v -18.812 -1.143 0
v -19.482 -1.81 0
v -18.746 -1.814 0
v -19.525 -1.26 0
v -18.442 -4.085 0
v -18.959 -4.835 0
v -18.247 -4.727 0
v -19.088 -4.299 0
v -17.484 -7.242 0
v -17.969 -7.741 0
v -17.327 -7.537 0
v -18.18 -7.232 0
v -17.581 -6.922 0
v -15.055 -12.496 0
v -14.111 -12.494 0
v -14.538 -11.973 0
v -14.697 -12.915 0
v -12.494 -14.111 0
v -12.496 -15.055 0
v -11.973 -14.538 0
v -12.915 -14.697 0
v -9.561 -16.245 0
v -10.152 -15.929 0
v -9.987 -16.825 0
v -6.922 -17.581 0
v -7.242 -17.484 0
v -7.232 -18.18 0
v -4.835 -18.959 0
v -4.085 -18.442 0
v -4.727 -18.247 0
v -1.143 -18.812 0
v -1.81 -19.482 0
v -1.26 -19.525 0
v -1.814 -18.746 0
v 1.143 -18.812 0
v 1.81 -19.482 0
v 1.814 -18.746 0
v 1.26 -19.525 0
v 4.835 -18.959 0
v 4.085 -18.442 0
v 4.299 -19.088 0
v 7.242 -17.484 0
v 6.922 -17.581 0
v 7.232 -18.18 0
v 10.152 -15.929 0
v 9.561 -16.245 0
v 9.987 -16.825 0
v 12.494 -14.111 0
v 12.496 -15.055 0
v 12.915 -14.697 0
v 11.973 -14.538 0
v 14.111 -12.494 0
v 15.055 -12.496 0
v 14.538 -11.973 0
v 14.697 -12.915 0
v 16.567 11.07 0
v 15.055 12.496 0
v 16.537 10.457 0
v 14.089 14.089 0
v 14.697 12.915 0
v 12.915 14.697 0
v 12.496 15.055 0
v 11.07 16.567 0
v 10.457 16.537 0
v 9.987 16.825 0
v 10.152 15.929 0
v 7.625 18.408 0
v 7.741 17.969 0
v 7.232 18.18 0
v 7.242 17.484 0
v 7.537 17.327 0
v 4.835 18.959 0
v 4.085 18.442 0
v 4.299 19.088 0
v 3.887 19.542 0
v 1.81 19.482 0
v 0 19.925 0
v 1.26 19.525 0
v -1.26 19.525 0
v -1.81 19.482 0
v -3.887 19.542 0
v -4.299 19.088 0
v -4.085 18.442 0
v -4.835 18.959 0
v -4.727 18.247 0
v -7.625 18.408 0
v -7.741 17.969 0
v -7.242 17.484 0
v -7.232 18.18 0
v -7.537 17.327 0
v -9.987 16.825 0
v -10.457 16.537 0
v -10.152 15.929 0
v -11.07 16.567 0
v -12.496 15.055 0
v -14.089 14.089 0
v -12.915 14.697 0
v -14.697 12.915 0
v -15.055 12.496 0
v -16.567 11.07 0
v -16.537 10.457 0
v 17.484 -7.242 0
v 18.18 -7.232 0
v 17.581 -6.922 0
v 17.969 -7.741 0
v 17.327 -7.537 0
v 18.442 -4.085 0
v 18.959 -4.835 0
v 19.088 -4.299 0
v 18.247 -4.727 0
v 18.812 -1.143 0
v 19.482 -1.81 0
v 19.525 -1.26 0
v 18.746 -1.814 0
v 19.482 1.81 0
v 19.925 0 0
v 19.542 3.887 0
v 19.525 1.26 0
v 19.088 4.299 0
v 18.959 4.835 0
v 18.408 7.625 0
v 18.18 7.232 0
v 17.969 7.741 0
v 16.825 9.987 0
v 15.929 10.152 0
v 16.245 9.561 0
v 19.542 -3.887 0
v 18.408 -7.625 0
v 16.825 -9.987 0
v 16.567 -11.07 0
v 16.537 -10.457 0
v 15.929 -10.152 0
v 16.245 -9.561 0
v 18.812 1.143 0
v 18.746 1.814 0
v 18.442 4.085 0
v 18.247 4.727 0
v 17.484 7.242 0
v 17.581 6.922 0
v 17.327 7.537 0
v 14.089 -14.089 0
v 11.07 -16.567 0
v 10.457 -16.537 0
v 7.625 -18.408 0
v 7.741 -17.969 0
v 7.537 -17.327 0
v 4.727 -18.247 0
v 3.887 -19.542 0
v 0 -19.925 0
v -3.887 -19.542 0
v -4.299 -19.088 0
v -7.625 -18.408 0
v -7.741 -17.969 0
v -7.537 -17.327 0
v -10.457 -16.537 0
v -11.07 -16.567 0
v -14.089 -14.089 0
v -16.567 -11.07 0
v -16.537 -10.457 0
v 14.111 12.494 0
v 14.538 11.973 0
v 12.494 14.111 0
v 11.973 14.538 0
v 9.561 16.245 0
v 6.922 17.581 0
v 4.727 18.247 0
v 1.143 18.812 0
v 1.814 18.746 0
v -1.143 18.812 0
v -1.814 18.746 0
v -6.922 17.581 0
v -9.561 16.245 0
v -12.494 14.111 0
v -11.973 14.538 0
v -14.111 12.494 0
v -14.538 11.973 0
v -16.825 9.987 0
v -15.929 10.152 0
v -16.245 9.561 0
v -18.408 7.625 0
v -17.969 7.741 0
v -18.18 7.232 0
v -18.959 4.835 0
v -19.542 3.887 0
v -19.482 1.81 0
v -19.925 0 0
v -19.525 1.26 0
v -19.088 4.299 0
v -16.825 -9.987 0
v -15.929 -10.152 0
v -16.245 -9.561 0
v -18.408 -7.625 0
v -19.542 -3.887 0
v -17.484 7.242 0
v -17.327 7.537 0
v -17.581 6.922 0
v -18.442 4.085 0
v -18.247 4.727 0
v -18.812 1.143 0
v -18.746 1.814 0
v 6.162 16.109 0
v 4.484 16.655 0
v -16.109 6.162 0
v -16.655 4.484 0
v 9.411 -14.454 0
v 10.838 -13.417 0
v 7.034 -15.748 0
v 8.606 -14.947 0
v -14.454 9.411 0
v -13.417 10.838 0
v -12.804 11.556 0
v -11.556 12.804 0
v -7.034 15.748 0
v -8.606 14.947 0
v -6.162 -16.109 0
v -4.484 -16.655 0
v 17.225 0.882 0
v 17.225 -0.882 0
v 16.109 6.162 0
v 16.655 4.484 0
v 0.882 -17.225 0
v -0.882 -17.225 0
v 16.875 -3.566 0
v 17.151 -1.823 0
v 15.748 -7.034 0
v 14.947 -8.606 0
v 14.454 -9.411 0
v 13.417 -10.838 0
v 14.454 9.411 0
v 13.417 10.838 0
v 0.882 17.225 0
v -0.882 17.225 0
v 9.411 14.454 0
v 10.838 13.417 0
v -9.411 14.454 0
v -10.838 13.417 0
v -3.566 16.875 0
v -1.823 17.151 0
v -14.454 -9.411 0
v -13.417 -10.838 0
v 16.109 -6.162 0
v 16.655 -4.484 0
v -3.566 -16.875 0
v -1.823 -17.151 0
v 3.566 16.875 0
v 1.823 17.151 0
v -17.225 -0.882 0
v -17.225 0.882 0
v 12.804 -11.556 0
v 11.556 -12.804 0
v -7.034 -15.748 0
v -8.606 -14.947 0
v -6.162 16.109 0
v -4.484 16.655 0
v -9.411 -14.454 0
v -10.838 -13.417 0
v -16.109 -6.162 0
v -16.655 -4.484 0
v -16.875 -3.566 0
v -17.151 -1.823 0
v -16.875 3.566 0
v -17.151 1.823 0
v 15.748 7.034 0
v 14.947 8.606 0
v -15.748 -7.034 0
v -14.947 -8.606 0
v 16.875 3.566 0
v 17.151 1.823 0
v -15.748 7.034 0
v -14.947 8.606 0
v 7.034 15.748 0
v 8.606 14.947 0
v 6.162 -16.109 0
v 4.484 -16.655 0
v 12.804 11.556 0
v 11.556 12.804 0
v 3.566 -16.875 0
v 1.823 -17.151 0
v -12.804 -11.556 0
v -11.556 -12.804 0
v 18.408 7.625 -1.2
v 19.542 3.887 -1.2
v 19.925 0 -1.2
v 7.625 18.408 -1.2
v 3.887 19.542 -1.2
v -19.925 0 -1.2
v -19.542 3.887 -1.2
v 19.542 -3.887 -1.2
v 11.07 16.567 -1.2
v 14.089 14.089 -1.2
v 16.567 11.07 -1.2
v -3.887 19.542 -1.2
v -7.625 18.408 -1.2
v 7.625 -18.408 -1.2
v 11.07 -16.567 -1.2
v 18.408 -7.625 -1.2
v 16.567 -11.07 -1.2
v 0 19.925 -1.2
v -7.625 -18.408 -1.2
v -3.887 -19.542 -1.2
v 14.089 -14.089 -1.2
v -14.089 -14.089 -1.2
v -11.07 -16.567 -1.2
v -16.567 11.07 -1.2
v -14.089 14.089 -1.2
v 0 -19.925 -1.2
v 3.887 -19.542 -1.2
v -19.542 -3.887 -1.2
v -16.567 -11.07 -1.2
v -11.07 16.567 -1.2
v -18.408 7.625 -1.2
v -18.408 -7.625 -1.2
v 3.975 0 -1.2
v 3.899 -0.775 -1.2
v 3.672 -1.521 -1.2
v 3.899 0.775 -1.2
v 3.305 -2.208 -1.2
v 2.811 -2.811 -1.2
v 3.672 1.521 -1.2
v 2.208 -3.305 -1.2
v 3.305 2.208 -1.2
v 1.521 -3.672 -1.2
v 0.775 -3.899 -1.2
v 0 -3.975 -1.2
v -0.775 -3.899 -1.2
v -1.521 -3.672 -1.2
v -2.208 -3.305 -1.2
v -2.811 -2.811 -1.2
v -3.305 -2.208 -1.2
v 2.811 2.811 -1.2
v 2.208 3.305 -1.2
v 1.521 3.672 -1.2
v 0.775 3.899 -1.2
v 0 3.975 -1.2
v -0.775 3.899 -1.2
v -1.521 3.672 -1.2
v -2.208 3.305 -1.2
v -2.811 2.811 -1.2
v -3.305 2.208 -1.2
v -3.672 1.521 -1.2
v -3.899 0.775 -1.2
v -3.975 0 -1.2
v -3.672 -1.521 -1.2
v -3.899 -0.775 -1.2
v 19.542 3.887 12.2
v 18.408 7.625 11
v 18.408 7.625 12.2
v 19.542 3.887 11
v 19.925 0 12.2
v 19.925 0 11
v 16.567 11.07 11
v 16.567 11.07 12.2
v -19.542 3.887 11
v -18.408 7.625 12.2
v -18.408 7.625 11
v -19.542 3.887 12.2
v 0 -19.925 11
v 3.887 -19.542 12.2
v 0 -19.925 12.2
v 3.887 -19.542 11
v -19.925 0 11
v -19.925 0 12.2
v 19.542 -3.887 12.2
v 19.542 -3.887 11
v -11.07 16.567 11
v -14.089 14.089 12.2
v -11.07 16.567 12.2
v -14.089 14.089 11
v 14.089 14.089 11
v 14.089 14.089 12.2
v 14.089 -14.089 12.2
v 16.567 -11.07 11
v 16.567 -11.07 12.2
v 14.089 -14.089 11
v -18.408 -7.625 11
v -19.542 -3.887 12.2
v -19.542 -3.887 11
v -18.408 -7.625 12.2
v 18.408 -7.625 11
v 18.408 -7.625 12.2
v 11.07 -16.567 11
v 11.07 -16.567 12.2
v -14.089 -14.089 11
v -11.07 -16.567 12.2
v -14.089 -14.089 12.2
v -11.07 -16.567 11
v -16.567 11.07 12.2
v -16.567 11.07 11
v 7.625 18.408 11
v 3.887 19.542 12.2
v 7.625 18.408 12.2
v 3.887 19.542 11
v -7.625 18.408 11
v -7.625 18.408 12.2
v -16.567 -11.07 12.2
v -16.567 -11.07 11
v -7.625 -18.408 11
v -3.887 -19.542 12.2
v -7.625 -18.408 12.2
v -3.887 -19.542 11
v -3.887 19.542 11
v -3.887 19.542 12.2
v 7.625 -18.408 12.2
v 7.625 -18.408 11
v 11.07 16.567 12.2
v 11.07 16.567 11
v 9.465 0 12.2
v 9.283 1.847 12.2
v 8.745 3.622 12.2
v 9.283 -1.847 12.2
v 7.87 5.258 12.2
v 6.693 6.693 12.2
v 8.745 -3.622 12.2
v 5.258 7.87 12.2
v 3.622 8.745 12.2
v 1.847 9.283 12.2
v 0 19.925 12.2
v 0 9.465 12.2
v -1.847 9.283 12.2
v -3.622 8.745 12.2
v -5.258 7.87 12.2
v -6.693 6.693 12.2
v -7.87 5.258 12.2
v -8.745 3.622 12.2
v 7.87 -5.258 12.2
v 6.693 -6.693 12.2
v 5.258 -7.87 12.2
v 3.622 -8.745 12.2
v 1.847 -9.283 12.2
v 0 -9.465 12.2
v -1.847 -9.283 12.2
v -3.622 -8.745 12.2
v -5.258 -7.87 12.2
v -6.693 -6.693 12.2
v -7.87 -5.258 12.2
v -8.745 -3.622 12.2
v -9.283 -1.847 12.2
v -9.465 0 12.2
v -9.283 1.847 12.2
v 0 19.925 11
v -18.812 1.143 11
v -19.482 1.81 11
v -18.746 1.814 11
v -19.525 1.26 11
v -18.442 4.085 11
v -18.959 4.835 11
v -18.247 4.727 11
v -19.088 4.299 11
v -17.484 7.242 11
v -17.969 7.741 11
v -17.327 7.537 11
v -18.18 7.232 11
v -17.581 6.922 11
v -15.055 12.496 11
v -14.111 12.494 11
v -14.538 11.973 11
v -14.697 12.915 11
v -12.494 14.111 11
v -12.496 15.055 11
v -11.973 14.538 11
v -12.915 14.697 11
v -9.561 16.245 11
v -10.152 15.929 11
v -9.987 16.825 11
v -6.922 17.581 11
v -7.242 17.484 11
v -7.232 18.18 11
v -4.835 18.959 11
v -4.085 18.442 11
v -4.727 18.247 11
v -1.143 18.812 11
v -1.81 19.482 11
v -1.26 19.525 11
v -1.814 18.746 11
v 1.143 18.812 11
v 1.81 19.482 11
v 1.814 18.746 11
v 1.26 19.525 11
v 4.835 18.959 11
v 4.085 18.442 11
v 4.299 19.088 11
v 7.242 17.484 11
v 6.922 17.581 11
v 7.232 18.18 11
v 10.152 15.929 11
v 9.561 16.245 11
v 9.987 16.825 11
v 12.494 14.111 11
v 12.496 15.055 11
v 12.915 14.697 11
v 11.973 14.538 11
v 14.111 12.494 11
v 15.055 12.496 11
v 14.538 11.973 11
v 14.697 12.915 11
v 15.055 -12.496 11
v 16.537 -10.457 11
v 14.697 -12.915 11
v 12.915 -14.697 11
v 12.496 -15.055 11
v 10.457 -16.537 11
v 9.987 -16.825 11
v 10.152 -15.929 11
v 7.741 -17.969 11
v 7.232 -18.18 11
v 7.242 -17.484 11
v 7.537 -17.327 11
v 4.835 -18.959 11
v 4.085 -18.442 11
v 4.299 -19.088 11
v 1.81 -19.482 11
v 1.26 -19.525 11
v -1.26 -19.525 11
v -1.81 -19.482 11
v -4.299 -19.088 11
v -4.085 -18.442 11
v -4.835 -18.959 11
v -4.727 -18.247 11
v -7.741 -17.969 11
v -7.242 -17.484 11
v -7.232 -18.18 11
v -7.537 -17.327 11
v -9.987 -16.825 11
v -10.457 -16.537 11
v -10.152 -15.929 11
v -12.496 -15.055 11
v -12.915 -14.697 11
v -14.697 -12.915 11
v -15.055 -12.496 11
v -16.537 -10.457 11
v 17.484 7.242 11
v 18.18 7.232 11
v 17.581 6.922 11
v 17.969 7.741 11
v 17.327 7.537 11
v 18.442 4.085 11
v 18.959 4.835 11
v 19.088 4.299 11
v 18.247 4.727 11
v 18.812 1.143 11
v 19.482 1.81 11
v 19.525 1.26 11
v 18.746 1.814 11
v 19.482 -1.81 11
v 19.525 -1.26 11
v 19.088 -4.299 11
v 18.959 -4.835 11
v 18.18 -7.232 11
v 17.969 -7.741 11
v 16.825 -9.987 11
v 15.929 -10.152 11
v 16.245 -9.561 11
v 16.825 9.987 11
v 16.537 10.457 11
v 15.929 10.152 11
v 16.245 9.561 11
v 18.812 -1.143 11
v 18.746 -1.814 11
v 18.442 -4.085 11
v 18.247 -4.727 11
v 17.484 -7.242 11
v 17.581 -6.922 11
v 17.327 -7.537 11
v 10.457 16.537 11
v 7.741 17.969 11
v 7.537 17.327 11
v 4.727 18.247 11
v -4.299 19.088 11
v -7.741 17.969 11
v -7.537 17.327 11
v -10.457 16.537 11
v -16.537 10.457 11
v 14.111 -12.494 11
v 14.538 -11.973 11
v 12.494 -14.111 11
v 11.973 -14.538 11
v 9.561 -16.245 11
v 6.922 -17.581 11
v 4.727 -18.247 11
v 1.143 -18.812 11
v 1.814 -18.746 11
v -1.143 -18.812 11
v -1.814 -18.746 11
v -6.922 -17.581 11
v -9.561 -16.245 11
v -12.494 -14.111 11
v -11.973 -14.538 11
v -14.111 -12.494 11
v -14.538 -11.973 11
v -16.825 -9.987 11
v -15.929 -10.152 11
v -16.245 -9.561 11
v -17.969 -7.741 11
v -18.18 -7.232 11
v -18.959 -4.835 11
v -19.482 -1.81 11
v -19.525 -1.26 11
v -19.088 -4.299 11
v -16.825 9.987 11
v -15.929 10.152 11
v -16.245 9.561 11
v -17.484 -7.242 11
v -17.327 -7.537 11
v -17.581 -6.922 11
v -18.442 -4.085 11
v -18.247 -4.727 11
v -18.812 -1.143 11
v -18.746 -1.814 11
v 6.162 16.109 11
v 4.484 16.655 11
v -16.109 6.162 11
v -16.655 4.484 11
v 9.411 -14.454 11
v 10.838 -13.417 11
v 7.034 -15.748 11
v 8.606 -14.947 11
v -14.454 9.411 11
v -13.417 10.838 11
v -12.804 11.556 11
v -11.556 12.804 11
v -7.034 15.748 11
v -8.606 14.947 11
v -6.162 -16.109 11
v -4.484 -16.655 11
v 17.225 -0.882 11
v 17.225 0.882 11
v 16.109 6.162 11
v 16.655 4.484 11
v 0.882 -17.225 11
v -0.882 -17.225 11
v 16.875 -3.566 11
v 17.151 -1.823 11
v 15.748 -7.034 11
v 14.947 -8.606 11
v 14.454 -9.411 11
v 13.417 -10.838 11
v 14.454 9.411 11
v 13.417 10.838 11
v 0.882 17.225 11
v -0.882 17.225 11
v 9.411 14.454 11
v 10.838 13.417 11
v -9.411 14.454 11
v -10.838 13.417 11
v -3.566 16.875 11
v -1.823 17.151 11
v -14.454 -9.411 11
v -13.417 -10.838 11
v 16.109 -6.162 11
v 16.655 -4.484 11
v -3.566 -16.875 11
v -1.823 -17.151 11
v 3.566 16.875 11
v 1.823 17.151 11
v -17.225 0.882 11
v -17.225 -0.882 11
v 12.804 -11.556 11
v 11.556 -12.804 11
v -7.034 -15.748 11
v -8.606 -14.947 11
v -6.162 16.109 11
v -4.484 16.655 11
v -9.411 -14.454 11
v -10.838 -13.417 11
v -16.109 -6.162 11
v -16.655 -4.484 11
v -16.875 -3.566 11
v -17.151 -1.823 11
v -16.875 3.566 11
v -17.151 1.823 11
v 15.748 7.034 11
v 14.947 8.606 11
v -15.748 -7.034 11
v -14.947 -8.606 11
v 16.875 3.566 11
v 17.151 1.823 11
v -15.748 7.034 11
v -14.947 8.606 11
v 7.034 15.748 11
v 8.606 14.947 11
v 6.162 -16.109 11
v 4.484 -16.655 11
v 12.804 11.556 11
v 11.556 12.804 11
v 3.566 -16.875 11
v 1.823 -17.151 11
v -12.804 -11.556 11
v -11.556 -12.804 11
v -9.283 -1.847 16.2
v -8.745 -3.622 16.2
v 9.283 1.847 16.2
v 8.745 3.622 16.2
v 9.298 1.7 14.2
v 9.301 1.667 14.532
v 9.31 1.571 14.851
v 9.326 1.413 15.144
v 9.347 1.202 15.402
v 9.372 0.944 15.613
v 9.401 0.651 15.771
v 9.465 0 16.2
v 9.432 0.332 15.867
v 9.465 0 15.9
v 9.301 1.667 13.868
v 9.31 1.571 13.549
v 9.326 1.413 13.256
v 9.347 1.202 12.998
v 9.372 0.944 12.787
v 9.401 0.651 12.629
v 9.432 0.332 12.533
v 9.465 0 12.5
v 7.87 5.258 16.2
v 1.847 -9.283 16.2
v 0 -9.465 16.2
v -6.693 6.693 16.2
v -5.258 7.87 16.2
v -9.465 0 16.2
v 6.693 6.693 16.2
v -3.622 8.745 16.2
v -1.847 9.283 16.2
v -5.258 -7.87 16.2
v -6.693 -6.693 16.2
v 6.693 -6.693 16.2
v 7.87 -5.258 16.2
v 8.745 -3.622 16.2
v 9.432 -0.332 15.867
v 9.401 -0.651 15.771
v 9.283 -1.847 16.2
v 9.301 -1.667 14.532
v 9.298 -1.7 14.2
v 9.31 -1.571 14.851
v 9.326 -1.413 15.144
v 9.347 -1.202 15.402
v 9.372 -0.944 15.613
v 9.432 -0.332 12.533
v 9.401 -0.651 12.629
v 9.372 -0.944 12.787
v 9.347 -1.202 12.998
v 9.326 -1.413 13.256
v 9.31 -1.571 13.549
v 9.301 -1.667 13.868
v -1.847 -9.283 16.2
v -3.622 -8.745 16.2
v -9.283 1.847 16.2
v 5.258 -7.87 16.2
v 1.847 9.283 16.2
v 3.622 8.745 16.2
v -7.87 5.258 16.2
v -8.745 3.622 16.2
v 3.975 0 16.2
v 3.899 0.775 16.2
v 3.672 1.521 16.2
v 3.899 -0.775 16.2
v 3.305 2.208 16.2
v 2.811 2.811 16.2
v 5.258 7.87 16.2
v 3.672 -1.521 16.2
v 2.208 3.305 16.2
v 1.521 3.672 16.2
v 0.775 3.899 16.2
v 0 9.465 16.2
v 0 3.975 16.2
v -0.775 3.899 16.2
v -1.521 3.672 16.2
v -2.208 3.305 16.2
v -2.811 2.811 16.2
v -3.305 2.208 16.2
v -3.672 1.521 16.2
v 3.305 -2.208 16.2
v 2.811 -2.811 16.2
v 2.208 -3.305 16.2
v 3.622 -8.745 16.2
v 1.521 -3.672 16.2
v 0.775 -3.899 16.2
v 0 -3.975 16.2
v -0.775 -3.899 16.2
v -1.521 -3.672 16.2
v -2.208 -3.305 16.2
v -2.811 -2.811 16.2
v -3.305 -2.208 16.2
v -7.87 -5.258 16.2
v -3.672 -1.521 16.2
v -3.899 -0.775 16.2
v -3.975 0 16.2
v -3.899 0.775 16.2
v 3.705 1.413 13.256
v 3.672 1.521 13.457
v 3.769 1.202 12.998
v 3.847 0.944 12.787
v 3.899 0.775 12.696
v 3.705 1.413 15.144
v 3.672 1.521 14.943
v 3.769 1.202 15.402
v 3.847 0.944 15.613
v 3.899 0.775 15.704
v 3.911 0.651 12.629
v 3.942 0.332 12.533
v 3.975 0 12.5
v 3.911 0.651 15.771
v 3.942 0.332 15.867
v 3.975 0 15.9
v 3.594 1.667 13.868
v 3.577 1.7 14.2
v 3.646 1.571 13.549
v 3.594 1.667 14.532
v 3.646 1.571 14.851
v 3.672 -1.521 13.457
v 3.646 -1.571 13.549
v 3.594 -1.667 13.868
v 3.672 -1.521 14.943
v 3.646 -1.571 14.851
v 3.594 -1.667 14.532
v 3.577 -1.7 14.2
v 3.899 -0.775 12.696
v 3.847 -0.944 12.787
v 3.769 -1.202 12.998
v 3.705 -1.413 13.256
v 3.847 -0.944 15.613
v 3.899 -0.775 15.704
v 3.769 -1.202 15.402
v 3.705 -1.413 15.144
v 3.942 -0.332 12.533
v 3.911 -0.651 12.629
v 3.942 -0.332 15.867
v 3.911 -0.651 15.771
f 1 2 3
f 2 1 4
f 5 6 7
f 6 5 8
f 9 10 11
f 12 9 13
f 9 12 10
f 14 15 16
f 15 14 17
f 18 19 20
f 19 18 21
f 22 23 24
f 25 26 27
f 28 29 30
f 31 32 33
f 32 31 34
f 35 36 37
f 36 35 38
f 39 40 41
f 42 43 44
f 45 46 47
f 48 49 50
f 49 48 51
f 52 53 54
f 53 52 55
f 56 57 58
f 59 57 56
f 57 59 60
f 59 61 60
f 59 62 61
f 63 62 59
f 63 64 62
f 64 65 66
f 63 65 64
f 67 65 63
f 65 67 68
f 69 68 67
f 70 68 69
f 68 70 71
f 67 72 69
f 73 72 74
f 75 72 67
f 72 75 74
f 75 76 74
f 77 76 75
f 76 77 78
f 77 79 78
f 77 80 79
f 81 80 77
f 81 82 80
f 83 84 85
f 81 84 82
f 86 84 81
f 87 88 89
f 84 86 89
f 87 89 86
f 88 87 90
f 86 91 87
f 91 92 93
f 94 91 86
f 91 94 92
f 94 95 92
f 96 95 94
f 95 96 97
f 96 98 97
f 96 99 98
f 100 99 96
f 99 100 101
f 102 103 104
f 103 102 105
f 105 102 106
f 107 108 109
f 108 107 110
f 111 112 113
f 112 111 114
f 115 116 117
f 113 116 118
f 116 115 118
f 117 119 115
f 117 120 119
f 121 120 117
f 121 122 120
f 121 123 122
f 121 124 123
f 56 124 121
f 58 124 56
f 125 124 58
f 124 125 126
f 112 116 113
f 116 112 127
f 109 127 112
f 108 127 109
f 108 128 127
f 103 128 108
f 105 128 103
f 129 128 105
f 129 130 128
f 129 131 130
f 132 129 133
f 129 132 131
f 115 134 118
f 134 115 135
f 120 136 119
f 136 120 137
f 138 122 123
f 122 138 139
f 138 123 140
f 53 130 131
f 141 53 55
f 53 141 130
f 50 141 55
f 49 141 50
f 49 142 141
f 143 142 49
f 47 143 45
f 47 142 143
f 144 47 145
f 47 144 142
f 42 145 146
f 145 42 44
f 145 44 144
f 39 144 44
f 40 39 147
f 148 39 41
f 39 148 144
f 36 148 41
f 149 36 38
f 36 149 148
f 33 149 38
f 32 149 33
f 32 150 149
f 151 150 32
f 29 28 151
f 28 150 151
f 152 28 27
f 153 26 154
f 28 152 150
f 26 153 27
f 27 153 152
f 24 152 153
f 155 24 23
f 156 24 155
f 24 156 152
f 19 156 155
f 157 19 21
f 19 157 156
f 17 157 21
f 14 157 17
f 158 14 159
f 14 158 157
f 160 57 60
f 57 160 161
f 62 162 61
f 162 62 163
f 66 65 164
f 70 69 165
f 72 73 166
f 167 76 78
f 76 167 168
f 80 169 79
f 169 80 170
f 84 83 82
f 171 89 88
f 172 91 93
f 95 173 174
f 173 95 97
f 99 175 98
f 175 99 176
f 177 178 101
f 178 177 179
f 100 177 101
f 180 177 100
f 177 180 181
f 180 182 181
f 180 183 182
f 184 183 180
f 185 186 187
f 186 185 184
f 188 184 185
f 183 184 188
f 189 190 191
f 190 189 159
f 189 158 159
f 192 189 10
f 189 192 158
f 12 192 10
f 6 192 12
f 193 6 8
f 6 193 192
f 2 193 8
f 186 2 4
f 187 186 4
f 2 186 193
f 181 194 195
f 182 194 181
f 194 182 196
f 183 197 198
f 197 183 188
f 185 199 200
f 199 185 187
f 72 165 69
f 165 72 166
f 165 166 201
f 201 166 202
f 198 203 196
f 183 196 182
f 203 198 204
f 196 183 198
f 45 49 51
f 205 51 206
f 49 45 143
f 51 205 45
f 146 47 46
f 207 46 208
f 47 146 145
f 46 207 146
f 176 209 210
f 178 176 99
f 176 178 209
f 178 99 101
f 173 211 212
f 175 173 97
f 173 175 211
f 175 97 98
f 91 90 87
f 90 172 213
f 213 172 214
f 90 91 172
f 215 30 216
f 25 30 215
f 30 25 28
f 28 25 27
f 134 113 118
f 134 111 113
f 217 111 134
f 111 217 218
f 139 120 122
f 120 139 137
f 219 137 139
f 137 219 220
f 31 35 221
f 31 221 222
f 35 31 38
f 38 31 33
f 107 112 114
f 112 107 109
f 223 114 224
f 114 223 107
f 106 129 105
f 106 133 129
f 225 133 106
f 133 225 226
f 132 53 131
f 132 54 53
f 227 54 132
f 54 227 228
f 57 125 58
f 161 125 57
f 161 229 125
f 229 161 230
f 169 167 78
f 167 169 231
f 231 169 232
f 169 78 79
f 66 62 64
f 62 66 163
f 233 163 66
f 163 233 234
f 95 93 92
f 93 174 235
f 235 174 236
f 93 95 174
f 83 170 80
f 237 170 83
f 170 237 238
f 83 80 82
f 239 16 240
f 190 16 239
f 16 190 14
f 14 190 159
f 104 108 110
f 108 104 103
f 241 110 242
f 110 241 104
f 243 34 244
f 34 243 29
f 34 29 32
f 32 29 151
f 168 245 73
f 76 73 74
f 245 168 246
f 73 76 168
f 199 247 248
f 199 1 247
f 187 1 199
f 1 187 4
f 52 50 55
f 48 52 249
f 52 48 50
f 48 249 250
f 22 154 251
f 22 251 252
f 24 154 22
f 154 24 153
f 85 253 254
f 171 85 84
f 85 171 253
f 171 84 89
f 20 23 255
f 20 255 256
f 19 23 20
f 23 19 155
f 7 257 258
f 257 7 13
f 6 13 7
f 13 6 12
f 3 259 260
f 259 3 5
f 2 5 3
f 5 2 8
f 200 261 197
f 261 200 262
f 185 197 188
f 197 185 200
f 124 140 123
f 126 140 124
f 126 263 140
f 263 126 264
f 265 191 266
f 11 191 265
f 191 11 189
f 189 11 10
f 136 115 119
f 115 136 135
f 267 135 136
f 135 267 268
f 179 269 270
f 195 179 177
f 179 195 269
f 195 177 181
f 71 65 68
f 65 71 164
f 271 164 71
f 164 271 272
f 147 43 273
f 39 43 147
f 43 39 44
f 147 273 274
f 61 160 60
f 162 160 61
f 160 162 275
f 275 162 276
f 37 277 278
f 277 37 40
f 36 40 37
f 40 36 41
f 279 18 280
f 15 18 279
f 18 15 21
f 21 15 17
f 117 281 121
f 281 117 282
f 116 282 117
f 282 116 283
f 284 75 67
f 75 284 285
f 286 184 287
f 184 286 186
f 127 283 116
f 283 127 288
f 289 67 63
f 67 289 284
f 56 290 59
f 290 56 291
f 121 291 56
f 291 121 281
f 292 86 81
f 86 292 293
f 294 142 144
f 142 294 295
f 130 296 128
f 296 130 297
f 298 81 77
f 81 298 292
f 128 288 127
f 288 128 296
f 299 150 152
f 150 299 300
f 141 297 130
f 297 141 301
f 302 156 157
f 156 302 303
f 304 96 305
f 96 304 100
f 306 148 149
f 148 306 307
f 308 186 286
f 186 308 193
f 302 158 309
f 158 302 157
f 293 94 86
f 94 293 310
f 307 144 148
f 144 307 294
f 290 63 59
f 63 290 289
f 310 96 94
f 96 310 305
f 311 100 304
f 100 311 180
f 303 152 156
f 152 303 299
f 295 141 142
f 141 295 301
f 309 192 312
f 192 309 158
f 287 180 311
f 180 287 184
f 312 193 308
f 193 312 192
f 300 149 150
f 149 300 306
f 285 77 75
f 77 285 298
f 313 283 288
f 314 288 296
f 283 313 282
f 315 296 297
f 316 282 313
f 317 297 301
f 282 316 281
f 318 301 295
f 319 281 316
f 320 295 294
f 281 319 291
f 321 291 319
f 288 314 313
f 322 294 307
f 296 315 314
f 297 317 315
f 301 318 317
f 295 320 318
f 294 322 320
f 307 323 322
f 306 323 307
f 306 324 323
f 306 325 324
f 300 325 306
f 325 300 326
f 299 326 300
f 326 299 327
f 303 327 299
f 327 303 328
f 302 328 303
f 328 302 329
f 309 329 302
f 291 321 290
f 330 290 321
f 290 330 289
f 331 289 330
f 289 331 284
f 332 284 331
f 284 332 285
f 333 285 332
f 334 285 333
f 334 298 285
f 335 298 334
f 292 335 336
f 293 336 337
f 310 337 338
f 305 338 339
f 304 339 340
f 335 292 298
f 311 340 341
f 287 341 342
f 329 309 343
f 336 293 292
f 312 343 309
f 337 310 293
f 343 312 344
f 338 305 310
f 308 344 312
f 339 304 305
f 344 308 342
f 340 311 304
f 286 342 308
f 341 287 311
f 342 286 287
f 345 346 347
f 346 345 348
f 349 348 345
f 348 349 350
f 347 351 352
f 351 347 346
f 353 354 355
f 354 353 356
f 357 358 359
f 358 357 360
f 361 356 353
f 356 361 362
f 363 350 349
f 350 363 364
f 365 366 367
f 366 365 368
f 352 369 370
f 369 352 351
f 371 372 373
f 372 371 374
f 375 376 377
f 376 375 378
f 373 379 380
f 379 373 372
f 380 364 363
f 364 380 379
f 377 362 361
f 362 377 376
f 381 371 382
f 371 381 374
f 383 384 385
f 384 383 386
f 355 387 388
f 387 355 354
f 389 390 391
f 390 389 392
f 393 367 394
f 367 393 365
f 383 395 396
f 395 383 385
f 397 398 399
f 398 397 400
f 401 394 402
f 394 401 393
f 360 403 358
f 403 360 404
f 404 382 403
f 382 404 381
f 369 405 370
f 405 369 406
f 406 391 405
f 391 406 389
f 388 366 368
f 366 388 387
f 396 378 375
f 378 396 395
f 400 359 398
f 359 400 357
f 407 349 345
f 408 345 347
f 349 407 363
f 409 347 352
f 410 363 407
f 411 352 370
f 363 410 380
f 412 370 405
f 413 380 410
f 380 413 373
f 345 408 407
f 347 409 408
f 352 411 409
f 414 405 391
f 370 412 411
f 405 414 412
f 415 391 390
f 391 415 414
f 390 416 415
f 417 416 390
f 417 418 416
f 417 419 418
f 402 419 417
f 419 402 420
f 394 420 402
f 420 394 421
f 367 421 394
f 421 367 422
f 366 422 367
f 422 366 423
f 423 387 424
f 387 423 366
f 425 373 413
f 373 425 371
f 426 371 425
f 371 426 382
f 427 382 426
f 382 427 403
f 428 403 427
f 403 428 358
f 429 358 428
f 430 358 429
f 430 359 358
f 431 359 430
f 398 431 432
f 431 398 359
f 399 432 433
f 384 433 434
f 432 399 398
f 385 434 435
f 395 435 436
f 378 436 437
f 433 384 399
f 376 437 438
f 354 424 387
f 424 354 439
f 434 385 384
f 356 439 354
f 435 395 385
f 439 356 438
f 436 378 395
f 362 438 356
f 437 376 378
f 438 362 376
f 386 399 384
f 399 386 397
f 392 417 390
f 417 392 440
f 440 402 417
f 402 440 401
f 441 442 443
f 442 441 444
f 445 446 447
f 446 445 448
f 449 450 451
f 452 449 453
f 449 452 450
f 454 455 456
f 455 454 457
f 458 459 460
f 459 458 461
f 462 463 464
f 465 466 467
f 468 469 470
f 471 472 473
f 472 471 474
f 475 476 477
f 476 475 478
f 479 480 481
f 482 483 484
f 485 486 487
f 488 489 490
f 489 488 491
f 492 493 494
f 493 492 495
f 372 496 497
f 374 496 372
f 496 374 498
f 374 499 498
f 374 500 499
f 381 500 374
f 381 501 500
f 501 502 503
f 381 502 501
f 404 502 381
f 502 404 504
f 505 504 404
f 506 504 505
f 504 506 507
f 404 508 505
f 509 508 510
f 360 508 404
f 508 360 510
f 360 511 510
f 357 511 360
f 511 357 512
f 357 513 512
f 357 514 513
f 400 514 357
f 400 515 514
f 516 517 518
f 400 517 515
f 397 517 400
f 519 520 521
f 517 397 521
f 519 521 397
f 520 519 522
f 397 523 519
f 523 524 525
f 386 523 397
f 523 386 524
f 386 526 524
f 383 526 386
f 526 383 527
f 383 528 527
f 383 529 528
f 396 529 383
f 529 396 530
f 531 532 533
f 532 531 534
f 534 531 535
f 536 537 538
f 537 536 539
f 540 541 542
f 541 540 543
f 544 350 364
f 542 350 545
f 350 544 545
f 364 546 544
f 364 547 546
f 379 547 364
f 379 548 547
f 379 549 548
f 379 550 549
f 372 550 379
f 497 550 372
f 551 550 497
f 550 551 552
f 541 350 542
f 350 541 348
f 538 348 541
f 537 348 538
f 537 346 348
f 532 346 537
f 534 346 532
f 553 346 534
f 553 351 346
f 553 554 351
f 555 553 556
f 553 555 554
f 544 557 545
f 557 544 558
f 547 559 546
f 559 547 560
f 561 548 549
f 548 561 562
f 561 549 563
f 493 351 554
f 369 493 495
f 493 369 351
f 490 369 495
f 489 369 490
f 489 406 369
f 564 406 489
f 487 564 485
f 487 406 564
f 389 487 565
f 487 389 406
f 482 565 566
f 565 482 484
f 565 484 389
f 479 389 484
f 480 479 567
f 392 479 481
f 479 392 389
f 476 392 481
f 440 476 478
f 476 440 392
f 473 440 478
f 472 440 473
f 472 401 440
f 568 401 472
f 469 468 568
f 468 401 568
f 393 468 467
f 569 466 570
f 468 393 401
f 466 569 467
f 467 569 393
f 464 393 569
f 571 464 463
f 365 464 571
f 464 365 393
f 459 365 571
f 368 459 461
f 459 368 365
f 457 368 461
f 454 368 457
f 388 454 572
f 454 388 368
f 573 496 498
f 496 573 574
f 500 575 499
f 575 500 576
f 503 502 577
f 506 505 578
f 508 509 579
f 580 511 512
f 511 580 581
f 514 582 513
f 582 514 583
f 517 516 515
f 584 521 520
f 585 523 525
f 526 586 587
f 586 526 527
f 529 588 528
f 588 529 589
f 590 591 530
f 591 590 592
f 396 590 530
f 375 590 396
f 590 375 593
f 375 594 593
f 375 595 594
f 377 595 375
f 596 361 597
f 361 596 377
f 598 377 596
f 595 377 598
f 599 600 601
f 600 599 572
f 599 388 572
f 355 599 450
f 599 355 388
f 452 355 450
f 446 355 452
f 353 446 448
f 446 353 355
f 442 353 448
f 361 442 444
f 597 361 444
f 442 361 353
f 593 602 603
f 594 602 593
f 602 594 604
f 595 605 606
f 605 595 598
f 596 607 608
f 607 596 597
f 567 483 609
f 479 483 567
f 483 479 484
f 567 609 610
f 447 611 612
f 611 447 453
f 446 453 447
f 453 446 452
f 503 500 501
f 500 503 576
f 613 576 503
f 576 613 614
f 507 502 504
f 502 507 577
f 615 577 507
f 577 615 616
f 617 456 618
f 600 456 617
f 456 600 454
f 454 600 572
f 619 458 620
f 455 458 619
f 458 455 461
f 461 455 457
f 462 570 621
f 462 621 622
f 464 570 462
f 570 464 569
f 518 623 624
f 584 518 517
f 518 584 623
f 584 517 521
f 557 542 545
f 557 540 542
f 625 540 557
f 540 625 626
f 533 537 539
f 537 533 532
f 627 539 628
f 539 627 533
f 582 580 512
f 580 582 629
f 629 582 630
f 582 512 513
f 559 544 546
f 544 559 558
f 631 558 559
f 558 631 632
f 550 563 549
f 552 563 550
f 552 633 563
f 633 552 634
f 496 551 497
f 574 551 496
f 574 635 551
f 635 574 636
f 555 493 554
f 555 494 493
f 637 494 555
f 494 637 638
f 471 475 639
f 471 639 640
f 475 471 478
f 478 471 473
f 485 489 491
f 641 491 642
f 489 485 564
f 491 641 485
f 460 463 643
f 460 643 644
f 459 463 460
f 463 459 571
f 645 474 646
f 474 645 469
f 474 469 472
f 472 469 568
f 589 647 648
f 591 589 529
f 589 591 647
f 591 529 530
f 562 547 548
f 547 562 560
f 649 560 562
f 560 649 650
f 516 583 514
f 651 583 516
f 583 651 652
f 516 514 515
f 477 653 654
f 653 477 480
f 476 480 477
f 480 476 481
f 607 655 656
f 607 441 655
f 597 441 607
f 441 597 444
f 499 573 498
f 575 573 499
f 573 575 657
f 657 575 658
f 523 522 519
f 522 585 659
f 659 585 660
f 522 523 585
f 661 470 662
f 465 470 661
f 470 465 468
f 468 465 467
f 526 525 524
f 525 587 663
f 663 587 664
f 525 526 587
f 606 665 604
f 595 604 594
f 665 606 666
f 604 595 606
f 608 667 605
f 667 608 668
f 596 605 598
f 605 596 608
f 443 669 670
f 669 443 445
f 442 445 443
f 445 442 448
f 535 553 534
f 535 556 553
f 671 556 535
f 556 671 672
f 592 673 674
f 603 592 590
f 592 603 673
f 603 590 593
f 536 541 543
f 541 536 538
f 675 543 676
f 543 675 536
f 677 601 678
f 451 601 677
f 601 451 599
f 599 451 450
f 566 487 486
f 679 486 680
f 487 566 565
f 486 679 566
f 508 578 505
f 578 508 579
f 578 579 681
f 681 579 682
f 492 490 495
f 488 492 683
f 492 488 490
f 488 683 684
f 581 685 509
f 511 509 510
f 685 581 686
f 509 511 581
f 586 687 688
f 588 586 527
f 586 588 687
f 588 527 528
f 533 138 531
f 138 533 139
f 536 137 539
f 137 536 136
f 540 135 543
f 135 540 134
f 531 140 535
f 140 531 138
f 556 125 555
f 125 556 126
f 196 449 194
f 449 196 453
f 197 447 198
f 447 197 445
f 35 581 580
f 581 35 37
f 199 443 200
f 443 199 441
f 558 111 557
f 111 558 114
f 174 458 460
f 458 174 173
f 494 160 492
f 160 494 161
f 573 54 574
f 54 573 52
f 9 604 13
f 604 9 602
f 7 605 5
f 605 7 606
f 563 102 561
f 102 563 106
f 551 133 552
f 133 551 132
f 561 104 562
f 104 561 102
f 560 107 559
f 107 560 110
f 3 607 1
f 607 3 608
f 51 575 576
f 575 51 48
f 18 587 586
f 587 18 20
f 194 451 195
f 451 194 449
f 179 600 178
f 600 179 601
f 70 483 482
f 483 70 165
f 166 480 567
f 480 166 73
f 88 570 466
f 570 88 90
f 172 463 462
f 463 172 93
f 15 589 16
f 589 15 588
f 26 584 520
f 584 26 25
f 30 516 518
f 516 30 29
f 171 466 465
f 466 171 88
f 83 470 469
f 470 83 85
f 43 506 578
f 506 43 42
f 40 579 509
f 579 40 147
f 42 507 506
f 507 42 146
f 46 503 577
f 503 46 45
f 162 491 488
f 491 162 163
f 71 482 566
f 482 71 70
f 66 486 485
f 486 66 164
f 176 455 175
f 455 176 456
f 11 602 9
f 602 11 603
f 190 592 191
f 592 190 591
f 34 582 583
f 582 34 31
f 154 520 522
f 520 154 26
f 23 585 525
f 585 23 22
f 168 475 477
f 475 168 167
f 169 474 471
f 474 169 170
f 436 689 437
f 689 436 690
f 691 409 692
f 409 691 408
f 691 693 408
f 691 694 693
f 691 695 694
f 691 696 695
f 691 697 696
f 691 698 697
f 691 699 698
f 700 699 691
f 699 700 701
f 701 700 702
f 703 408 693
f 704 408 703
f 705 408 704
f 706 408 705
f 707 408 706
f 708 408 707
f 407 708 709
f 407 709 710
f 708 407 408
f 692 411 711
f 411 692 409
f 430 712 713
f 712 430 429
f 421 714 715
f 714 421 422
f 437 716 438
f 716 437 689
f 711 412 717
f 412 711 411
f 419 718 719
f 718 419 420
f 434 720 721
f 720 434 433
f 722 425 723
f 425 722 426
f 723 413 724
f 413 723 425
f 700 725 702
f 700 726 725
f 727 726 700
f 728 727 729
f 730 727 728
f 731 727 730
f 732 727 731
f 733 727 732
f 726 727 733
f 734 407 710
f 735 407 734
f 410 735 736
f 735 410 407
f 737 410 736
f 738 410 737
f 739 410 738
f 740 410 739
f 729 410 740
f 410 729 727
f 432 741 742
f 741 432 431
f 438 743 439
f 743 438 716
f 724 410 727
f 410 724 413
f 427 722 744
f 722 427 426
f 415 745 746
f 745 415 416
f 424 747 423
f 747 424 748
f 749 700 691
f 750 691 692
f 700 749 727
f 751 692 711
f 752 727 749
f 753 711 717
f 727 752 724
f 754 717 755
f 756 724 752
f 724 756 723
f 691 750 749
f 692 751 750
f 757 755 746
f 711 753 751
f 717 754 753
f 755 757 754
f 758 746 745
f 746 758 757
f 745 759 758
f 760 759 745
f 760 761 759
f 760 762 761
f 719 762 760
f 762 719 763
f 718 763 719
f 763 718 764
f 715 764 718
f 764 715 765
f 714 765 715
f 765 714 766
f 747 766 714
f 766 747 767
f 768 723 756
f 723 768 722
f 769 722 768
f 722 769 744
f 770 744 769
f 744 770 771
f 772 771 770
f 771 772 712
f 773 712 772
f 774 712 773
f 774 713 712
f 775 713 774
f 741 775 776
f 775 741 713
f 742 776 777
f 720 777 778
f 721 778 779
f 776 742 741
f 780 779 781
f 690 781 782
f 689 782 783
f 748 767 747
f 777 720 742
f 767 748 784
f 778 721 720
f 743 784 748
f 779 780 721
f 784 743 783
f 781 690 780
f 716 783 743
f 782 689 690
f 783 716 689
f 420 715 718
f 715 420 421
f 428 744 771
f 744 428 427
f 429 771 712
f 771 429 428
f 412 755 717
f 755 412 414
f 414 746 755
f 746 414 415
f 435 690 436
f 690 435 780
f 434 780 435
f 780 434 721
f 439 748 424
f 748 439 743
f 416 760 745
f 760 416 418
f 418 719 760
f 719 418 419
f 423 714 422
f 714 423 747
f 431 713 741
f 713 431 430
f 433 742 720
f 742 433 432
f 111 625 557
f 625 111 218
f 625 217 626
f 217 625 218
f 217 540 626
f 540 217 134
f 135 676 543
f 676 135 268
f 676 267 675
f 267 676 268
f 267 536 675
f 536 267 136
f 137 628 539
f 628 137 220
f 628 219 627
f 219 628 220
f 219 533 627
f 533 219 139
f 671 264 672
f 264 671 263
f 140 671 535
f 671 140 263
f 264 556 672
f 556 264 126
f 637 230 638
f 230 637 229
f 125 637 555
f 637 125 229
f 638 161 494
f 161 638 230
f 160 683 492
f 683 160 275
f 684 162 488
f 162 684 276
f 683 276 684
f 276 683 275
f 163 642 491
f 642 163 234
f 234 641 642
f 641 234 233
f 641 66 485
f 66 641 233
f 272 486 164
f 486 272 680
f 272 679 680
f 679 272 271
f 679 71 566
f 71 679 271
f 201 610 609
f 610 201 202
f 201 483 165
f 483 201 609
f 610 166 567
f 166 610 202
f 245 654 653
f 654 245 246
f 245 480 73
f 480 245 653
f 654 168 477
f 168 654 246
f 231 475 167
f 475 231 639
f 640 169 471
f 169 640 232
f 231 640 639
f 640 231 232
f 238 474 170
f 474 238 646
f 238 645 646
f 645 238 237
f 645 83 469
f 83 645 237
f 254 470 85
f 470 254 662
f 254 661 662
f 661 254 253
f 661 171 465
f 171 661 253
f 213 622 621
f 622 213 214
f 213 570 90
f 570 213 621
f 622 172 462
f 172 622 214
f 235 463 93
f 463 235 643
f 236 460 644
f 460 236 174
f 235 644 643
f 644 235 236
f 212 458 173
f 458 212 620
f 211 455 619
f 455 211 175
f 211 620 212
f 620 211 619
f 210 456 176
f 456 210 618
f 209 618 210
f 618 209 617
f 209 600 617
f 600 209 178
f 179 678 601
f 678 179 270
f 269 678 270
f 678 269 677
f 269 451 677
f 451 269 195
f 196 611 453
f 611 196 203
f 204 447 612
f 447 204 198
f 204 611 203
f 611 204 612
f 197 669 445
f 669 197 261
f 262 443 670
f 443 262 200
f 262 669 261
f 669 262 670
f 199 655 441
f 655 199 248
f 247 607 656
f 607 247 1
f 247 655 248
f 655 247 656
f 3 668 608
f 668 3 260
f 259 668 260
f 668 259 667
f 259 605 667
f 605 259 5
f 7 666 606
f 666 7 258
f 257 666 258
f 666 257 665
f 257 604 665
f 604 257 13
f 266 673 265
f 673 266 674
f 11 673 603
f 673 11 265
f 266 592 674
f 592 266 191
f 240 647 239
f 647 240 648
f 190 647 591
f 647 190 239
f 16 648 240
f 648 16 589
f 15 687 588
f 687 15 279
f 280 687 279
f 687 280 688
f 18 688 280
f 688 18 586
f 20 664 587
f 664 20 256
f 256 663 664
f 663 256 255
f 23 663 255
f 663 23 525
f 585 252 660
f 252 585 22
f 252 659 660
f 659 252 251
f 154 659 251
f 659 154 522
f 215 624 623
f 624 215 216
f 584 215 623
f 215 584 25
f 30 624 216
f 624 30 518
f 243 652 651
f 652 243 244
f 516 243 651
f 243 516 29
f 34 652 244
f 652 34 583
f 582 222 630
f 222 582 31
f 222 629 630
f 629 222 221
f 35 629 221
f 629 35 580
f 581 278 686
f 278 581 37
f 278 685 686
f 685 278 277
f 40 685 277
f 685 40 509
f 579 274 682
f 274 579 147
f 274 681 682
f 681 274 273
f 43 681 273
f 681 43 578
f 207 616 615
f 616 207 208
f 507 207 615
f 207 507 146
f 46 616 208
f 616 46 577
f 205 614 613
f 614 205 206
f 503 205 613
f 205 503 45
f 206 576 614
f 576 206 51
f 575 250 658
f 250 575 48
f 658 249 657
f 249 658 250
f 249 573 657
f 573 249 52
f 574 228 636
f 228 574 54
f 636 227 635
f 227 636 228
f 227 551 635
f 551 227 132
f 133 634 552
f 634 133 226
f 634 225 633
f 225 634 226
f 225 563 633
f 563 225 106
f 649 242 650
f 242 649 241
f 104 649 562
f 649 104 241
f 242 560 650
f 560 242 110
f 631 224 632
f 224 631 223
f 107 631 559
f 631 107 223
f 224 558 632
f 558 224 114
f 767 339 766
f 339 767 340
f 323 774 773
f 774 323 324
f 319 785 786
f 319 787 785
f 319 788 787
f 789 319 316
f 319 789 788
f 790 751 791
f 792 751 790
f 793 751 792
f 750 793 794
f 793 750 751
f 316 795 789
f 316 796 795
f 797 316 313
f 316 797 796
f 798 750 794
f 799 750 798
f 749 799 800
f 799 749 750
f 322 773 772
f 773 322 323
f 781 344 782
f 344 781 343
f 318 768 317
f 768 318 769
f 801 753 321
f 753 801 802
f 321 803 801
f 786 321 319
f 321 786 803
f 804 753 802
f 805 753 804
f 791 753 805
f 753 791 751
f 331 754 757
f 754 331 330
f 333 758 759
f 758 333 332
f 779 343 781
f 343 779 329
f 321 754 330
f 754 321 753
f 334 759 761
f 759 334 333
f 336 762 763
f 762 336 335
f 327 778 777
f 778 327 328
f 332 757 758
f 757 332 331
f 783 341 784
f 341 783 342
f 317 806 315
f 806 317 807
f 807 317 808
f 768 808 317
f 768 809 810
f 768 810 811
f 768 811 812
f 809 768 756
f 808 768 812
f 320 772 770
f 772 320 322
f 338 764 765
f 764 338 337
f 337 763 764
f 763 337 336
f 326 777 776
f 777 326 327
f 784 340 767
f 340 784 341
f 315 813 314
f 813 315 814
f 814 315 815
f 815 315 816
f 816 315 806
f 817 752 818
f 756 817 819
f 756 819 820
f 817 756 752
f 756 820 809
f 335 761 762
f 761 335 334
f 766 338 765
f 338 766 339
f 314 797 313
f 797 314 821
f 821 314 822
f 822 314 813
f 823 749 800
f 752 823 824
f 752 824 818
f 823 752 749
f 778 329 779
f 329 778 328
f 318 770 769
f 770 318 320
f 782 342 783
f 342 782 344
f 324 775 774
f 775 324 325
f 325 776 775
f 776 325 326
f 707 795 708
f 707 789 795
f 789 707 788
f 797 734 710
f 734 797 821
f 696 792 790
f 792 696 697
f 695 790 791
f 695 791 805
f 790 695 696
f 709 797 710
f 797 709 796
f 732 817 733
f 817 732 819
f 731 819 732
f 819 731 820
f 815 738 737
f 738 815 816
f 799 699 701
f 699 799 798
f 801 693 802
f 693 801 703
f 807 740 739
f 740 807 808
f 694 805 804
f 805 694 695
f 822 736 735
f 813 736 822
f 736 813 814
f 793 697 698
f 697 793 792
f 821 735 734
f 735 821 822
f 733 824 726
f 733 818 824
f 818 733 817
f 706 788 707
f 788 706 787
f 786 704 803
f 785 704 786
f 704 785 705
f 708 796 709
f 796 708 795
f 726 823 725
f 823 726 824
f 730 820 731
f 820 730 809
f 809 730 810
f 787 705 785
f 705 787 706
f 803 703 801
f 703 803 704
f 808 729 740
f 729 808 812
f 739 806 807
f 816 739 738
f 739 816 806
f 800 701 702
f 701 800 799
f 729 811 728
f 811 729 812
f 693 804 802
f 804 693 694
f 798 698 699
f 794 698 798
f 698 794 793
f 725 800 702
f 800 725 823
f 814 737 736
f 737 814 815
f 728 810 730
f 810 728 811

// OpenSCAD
$fn = 32;

// ----------------------------------------------------------------------
// Timing pulley: GT3 40T, pitch 3 mm, 39.85 mm x 17.4 mm
// ----------------------------------------------------------------------

// --- parameters (mm) ---
pitch_mm = 3;             // belt pitch
tooth_count = 40;         // number of grooves
width = 11;               // belt width between the flanges
tip_d = 37.85;            // tip circle diameter
root_d = 35.65;           // groove bottom diameter
groove_h = 1.1;           // groove depth
tooth_w = 2.1;            // groove width at the tip circle
side_d = 39.85;           // flange diameter
side_t = 1.2;             // flange thickness
spigot_d = 34.05;         // flange spigot, sunk into the rim
spigot_h = 1.2;           // spigot depth into the rim
hub_bore = 7.95;          // shaft bore
hub_d = 18.93;            // hub diameter
hub_h = 4;                // hub above the flange
bottom_z = -1.2;          // lowest point of the pulley
top_z = 16.2;             // highest point of the pulley
set_d = 3.4;              // set screw tap hole

module rim() {
  cylinder(h = width, d = tip_d);
}

module groove_cutter() {
  /* belt tooth groove: deeper than wide, cut through the belt width */
  translate([root_d / 2, 0, 0])
    linear_extrude(height = width)
      polygon(points = [[-0.6, -tooth_w * 0.42], [groove_h + 0.6, -tooth_w * 0.6],
                        [groove_h + 0.6, tooth_w * 0.6], [-0.6, tooth_w * 0.42]]);
}

module flanges() {
  translate([0, 0, -side_t]) cylinder(h = side_t, d = side_d);
  translate([0, 0, width]) cylinder(h = side_t, d = side_d);
  translate([0, 0, -spigot_h]) cylinder(h = spigot_h + 0.6, d = spigot_d);
  translate([0, 0, width - 0.6]) cylinder(h = spigot_h + 0.6, d = spigot_d);
}

module hub() {
  translate([0, 0, bottom_z]) cylinder(h = top_z - bottom_z, d = hub_d);
}

difference() {
  union() {
    rim();
    hub();
    flanges();
  }
  for (i = [0 : tooth_count - 1]) rotate([0, 0, i * 360 / tooth_count]) groove_cutter();
  translate([0, 0, bottom_z - 1]) cylinder(h = top_z - bottom_z + 2, d = hub_bore);
  translate([-1, 0, top_z - hub_h * 0.5]) rotate([0, 90, 0]) cylinder(h = hub_d / 2 + 3, d = set_d);
}
